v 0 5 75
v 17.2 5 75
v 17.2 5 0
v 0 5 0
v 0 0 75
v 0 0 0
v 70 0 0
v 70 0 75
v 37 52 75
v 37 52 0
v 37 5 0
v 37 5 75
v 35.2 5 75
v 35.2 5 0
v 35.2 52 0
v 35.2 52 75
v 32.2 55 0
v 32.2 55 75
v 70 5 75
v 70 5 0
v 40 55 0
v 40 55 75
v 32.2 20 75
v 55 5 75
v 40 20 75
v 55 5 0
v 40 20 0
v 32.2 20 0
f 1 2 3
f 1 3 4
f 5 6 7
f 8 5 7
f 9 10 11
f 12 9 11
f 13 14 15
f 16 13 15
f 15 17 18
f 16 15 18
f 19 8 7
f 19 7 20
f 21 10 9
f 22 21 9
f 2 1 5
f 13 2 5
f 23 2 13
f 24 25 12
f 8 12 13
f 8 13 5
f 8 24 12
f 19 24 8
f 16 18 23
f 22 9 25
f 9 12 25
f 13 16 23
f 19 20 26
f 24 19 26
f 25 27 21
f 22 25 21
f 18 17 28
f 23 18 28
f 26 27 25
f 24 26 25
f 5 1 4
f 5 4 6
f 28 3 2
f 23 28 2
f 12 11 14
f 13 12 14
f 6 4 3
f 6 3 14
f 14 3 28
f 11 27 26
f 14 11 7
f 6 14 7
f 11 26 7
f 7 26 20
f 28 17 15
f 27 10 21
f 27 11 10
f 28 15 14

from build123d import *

# Parameters (mm, degrees)
EXTRUDE_1_DEPTH = 75
CHAMFER_1_SIZE  = 15
CHAMFER_2_SIZE  = 3


with BuildPart() as part:
    # 草图1 → 凸台-拉伸1 (new body)
    with BuildSketch(Plane.XY):
        Polygon((0, 0), (70, 0), (70, 5), (40, 5), (40, 55), (37, 55), (37, 5), (35.2, 5), (35.2, 55), (32.2, 55), (32.2, 5), (0, 5), align=None)
    extrude(amount=EXTRUDE_1_DEPTH)

    # 倒角1
    chamfer_1_edges = [part.edges().sort_by_distance(p)[0] for p in [
        (32.2, 5, 37.5),
        (40, 5, 37.5),
    ]]
    chamfer(chamfer_1_edges, length=CHAMFER_1_SIZE)

    # 倒角2
    chamfer_2_edges = [part.edges().sort_by_distance(p)[0] for p in [
        (37, 55, 37.5),
        (35.2, 55, 37.5),
    ]]
    chamfer(chamfer_2_edges, length=CHAMFER_2_SIZE - 0.0001)  # a hair under: the kernel refuses the full size


solid = part.part
